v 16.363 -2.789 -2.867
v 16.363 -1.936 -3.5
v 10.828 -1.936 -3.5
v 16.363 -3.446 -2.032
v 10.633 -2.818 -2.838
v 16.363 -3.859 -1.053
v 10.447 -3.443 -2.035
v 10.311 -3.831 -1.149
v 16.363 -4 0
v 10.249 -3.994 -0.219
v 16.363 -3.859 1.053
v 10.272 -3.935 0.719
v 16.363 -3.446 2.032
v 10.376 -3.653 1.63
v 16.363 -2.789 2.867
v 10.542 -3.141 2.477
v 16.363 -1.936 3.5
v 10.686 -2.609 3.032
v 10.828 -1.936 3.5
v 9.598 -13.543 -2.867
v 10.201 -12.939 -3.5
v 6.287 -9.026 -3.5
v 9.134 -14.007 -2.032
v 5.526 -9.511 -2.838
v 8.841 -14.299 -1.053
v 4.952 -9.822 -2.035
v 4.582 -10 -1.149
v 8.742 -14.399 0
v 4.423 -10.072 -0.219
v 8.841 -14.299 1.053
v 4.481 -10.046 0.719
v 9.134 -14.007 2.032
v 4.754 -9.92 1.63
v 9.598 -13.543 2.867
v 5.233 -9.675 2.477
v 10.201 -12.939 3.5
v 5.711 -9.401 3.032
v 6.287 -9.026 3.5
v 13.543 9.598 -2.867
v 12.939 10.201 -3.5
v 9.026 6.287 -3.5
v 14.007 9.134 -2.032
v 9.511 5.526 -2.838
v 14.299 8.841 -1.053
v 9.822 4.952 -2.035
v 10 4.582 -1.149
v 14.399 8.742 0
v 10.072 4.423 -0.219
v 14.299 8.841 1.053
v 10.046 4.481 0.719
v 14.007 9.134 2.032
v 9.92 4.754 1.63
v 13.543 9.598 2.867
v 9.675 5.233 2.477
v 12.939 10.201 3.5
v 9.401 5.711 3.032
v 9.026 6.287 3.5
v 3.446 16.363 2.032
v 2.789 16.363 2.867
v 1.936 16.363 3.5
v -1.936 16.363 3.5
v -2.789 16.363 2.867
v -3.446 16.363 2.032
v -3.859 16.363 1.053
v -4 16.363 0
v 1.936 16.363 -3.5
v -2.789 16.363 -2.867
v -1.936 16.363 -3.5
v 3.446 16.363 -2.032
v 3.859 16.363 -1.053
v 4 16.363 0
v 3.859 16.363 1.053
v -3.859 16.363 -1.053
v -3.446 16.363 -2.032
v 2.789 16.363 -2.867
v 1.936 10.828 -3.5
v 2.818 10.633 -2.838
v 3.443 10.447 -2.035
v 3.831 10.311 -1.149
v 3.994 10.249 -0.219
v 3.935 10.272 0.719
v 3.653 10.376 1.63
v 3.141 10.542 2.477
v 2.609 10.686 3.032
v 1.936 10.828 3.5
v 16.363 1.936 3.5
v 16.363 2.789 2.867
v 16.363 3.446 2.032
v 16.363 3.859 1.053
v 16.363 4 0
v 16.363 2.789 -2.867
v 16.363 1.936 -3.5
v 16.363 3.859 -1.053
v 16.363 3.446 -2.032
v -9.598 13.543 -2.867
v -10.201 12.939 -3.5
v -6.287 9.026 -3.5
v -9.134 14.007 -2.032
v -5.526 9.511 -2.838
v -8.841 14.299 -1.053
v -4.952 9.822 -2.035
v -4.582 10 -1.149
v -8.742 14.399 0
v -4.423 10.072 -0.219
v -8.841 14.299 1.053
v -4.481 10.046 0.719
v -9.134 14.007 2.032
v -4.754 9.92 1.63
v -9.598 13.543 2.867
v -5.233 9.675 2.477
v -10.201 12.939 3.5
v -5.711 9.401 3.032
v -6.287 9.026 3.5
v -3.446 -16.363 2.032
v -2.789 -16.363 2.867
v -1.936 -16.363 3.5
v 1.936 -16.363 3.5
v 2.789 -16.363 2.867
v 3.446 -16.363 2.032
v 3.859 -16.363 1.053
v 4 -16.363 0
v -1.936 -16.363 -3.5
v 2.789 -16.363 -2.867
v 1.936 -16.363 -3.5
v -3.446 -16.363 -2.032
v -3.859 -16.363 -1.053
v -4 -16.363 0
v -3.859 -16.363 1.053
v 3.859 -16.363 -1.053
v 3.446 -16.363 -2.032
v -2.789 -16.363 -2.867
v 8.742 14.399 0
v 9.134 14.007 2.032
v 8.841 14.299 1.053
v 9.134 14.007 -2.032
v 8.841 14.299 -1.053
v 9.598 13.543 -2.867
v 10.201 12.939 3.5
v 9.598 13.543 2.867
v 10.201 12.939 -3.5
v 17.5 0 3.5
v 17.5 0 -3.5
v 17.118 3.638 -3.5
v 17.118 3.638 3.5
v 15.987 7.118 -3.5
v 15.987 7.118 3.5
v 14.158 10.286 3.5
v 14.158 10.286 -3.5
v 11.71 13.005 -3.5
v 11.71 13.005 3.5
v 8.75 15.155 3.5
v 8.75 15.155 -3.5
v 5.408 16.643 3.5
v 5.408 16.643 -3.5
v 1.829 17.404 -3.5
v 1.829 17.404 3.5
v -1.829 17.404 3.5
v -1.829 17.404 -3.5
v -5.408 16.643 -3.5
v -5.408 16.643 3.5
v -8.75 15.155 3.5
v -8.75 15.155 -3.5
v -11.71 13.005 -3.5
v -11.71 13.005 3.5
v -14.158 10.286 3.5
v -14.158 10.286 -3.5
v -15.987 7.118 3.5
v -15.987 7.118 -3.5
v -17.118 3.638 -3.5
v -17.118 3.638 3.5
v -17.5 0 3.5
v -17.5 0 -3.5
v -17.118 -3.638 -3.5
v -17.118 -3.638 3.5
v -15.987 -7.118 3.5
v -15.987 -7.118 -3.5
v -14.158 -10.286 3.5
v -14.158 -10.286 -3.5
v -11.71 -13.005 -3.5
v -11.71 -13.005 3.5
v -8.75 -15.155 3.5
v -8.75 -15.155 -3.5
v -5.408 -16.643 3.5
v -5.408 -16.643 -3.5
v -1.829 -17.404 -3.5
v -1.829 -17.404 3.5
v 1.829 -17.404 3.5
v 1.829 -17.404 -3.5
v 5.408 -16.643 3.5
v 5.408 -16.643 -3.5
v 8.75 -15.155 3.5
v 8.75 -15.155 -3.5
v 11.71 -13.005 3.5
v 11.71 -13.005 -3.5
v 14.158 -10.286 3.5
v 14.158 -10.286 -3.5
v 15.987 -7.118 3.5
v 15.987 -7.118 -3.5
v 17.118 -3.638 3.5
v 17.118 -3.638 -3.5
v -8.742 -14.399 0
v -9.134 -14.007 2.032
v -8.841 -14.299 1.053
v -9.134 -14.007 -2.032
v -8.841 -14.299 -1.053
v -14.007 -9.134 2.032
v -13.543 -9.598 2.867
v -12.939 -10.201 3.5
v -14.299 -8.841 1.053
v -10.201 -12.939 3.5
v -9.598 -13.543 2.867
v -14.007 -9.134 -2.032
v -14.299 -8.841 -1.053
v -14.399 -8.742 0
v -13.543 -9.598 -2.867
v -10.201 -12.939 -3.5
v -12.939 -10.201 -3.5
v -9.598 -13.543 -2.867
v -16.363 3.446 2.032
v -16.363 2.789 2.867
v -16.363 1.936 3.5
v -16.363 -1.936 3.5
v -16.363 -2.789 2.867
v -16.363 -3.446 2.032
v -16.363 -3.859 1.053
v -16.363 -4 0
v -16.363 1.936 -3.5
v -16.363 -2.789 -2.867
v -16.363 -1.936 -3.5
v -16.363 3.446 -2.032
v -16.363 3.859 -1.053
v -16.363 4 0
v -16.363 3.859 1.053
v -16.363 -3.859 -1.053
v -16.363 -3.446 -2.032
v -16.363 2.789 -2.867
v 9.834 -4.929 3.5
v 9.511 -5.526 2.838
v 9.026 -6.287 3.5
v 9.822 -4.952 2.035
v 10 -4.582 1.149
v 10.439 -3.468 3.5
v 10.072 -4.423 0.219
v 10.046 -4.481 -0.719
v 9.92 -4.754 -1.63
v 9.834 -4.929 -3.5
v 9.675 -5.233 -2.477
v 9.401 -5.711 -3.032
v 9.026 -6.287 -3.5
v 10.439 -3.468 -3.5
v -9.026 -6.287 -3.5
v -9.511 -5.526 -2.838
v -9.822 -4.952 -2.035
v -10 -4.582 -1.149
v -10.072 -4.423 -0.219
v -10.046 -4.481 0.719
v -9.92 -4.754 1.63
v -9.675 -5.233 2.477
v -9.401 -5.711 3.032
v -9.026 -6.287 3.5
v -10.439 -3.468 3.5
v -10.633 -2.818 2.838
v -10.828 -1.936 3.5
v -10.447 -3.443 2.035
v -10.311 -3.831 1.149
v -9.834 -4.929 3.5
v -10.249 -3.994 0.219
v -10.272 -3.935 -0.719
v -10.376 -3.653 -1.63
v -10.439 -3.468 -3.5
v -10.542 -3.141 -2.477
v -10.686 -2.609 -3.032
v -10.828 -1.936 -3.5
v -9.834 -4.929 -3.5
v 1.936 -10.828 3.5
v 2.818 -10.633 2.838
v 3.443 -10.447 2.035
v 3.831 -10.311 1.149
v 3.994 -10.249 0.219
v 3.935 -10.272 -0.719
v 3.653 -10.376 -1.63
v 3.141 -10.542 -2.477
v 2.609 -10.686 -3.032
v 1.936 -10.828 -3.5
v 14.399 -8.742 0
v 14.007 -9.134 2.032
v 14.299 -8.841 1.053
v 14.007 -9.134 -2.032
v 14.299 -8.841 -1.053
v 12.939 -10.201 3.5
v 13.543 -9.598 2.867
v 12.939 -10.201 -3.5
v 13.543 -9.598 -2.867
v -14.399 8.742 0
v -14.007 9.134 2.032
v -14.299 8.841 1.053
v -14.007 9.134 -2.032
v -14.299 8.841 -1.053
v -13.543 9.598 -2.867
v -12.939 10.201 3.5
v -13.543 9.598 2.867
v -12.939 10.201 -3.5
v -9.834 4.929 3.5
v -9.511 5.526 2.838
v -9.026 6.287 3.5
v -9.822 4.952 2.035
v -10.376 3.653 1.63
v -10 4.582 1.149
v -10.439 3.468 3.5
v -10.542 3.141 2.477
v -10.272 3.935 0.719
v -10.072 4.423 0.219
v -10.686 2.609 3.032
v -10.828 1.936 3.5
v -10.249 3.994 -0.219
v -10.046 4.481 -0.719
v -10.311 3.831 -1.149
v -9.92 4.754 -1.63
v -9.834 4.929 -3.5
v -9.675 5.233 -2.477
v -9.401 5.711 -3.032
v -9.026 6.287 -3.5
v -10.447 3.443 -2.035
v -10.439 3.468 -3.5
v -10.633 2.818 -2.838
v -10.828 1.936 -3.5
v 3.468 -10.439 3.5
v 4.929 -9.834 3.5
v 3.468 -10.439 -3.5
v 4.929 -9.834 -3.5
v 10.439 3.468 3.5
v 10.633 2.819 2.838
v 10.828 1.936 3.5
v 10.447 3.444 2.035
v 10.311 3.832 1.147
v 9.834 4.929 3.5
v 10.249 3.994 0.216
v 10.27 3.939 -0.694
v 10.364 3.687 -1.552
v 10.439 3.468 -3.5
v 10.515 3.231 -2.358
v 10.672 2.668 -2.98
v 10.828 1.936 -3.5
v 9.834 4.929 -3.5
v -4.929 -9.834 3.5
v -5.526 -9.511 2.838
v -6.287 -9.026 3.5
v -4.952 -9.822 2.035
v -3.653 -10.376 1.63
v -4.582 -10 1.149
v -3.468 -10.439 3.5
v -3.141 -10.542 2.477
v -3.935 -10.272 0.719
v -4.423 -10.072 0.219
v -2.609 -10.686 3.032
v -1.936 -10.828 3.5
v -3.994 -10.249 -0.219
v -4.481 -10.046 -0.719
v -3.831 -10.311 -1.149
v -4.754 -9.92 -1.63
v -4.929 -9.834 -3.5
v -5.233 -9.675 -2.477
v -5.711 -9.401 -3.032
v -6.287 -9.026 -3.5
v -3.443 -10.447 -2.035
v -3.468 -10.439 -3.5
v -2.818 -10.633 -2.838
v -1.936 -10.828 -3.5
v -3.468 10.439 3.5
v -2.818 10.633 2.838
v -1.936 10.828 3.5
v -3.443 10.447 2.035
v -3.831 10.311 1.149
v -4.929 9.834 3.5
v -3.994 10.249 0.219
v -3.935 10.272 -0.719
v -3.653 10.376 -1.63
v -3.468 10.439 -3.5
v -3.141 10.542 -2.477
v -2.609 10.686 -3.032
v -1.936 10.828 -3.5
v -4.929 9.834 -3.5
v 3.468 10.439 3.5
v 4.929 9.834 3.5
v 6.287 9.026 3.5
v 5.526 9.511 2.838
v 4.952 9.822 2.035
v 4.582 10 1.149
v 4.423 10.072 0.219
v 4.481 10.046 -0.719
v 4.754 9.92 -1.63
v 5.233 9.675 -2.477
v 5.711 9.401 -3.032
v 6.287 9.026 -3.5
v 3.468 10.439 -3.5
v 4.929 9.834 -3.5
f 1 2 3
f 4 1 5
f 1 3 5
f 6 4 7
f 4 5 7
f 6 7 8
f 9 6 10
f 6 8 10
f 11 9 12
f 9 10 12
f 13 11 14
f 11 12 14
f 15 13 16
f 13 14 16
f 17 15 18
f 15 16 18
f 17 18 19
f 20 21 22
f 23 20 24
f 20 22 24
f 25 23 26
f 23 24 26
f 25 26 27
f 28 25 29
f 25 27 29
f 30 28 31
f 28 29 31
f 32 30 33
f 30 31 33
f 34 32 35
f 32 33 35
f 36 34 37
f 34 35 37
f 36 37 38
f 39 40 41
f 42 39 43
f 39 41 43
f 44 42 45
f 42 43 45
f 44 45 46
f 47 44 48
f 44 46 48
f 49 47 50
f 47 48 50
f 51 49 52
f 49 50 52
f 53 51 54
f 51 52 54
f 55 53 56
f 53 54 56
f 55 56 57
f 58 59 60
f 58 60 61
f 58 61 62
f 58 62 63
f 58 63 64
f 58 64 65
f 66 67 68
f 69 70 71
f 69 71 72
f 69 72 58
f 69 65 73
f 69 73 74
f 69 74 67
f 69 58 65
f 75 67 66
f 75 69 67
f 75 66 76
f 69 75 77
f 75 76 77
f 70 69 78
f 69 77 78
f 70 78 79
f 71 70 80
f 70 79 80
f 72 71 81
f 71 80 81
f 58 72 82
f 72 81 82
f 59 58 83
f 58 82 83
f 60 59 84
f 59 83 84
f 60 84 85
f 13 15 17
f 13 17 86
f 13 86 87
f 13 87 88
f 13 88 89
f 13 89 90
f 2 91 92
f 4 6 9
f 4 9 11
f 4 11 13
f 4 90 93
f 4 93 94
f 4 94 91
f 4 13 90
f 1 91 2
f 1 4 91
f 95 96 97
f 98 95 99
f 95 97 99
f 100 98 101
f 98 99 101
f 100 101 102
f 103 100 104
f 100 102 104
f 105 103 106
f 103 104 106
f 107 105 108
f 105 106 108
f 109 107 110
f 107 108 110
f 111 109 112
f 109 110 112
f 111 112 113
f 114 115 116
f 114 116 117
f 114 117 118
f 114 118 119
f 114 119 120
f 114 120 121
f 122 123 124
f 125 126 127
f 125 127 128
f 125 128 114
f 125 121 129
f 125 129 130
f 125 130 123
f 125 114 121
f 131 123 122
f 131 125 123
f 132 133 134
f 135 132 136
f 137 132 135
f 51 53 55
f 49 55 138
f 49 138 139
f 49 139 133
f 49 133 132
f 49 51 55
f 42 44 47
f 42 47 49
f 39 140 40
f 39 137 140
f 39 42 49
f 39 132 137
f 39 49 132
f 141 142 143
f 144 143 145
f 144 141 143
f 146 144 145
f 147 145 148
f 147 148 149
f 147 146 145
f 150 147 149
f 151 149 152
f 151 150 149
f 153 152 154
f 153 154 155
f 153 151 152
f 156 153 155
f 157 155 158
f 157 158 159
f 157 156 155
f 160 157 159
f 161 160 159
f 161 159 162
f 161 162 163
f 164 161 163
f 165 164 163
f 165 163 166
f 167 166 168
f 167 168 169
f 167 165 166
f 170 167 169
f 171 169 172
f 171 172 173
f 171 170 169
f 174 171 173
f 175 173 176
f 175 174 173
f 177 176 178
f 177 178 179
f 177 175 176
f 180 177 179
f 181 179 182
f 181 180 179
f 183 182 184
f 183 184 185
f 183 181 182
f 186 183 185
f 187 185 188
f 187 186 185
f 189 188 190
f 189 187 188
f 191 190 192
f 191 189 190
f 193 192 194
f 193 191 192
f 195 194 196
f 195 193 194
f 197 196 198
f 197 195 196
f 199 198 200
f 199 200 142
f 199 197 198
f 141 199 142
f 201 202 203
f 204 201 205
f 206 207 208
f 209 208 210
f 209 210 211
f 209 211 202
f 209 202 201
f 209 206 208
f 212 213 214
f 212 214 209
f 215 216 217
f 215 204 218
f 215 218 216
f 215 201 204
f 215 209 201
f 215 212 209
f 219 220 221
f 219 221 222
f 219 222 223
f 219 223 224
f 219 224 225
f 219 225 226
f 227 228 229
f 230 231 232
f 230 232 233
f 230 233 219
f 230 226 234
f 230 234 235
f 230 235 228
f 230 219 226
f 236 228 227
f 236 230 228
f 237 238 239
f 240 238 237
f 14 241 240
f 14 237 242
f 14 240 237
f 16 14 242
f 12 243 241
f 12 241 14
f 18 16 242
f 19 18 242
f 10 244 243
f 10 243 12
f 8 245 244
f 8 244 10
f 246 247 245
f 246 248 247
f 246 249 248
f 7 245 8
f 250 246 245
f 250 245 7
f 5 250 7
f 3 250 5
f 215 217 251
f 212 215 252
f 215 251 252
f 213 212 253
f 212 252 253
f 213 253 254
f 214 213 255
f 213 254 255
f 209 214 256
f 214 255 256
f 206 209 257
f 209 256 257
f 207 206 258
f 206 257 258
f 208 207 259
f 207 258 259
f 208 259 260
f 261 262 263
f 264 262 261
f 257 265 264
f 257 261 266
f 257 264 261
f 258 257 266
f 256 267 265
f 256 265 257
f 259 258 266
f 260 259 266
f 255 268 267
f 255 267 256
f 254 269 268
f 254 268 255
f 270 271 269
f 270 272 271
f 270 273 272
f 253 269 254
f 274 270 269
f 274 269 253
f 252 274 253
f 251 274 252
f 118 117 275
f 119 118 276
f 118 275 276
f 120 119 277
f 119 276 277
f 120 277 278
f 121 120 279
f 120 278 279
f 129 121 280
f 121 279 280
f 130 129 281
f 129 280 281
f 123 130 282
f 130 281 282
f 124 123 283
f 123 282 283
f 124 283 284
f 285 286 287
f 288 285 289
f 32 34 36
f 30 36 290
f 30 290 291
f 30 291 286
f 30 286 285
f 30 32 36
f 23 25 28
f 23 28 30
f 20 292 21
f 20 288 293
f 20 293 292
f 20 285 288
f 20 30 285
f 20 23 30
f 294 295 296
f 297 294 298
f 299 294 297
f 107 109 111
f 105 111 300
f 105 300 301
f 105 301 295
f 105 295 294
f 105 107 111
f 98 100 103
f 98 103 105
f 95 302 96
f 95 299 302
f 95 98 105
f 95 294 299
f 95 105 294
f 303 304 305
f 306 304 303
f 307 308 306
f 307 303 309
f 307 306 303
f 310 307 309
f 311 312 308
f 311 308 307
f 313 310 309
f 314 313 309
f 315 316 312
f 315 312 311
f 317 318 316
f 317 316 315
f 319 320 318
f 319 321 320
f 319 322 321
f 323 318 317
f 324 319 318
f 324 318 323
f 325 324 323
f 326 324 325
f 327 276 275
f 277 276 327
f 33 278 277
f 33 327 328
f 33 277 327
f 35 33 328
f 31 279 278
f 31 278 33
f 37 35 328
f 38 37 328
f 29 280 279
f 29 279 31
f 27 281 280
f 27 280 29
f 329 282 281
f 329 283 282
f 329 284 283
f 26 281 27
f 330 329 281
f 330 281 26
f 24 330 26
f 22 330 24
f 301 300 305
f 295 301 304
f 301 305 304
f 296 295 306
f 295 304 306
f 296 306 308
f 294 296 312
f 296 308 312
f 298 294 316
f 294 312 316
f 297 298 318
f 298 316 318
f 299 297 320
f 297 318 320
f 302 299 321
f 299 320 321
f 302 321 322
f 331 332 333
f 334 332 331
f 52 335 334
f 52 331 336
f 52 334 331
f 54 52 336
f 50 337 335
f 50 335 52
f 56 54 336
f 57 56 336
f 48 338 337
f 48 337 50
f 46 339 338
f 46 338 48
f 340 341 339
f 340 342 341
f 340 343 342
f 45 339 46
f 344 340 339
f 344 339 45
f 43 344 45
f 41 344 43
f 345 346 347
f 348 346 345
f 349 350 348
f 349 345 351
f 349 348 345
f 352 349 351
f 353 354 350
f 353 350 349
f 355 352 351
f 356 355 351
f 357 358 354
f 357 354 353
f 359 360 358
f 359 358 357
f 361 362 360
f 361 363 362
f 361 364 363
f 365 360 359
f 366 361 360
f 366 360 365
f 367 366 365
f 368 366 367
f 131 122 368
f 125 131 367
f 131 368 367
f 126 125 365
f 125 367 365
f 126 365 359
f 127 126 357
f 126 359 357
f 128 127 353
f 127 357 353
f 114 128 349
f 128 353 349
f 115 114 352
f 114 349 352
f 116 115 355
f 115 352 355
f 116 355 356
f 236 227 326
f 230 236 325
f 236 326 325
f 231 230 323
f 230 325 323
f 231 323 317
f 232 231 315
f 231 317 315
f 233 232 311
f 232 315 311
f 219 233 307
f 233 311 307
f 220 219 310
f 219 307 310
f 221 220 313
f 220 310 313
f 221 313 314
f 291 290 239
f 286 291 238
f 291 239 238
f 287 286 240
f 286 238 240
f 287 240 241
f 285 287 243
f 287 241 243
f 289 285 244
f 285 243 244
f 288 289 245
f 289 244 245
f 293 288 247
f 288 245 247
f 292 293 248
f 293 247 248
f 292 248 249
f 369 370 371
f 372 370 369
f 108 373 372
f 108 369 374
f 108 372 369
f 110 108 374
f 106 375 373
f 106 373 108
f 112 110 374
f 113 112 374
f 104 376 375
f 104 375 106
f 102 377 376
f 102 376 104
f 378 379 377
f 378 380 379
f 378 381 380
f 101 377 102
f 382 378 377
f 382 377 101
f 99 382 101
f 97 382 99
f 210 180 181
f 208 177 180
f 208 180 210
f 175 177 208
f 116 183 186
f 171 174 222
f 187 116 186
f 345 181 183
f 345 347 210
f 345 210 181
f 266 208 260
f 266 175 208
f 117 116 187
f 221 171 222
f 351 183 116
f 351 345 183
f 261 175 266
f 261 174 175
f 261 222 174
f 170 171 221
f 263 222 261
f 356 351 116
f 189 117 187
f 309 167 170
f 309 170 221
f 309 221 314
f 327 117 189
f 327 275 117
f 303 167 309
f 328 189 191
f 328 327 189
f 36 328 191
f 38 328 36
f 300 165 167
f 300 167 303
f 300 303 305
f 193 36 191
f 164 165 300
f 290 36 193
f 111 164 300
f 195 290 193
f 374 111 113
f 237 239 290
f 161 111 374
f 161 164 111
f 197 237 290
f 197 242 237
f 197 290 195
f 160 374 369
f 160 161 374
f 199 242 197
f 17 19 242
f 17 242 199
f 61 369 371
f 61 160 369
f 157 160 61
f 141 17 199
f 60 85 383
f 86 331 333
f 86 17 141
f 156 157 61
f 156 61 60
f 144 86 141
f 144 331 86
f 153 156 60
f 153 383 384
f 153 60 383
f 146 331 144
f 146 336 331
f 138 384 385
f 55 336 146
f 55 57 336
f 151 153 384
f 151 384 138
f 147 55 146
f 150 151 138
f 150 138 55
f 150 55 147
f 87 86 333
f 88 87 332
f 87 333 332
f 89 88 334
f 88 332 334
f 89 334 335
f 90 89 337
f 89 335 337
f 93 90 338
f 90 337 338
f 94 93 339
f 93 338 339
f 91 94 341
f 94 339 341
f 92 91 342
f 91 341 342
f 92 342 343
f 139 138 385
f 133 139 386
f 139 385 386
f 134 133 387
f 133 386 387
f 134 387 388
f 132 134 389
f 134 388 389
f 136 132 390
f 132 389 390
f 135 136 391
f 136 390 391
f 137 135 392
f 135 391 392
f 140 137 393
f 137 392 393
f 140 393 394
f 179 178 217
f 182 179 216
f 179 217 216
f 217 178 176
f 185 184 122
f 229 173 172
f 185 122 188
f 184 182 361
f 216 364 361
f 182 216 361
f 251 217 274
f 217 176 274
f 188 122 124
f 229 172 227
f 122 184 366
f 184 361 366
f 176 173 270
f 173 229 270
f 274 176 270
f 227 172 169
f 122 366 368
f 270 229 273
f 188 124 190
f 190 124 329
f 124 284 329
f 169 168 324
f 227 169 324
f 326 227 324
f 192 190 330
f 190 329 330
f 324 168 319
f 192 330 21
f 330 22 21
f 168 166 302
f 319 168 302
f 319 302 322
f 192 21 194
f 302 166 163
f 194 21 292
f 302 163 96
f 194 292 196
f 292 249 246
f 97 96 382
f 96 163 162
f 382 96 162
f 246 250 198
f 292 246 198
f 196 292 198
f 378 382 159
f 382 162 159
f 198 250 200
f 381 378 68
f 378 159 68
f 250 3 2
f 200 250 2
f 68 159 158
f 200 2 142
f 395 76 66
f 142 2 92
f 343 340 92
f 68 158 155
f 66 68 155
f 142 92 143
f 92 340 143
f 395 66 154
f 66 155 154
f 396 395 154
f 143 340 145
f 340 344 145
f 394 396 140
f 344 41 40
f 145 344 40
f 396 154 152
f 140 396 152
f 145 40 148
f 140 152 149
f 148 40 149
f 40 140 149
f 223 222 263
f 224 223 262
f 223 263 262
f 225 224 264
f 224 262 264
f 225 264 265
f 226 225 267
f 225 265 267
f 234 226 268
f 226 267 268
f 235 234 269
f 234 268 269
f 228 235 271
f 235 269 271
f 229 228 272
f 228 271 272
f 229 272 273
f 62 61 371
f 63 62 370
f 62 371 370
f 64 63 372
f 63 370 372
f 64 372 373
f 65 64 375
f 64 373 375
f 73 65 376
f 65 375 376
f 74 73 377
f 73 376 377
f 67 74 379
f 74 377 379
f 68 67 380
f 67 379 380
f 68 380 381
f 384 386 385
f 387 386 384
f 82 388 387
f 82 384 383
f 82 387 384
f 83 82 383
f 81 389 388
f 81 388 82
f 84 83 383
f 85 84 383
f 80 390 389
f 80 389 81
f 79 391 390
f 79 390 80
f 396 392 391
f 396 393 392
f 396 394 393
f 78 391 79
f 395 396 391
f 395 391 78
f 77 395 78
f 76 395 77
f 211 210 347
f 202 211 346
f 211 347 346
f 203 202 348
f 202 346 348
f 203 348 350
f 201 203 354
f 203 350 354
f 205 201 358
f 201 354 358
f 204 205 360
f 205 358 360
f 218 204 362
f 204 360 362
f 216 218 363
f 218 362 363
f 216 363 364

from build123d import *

# Parameters (mm, degrees)
SKETCH1_R           = 17.5
SKETCH1_R_2         = 11
BOSS_EXTRUDE1_DEPTH = 3.5
SKETCH4_R           = 4
CUT_EXTRUDE1_DEPTH  = 6.2
CIRPATTERN1_COUNT   = 8


with BuildPart() as part:
    # Sketch1 → Boss-Extrude1 (new, symmetric)
    with BuildSketch(Plane.XY):
        Circle(SKETCH1_R)
        Circle(SKETCH1_R_2, mode=Mode.SUBTRACT)
    extrude(amount=BOSS_EXTRUDE1_DEPTH, both=True)

    # Sketch4 → Cut-Extrude1 (cut)
    with BuildSketch(Plane(origin=(-10.162674858, 0, 0), x_dir=(0, 0, -1), z_dir=(1, 0, 0))):
        Circle(SKETCH4_R)
    cut_extrude1 = extrude(amount=-CUT_EXTRUDE1_DEPTH, mode=Mode.SUBTRACT)

    # CirPattern1: Cut-Extrude1 ×8 about axis
    cirpattern1_axis = Axis((0, 0, 3.5), (0, 0, -1))
    for i in range(1, CIRPATTERN1_COUNT):
        add(cut_extrude1.rotate(cirpattern1_axis, i * 360 / CIRPATTERN1_COUNT), mode=Mode.SUBTRACT)


solid = part.part
